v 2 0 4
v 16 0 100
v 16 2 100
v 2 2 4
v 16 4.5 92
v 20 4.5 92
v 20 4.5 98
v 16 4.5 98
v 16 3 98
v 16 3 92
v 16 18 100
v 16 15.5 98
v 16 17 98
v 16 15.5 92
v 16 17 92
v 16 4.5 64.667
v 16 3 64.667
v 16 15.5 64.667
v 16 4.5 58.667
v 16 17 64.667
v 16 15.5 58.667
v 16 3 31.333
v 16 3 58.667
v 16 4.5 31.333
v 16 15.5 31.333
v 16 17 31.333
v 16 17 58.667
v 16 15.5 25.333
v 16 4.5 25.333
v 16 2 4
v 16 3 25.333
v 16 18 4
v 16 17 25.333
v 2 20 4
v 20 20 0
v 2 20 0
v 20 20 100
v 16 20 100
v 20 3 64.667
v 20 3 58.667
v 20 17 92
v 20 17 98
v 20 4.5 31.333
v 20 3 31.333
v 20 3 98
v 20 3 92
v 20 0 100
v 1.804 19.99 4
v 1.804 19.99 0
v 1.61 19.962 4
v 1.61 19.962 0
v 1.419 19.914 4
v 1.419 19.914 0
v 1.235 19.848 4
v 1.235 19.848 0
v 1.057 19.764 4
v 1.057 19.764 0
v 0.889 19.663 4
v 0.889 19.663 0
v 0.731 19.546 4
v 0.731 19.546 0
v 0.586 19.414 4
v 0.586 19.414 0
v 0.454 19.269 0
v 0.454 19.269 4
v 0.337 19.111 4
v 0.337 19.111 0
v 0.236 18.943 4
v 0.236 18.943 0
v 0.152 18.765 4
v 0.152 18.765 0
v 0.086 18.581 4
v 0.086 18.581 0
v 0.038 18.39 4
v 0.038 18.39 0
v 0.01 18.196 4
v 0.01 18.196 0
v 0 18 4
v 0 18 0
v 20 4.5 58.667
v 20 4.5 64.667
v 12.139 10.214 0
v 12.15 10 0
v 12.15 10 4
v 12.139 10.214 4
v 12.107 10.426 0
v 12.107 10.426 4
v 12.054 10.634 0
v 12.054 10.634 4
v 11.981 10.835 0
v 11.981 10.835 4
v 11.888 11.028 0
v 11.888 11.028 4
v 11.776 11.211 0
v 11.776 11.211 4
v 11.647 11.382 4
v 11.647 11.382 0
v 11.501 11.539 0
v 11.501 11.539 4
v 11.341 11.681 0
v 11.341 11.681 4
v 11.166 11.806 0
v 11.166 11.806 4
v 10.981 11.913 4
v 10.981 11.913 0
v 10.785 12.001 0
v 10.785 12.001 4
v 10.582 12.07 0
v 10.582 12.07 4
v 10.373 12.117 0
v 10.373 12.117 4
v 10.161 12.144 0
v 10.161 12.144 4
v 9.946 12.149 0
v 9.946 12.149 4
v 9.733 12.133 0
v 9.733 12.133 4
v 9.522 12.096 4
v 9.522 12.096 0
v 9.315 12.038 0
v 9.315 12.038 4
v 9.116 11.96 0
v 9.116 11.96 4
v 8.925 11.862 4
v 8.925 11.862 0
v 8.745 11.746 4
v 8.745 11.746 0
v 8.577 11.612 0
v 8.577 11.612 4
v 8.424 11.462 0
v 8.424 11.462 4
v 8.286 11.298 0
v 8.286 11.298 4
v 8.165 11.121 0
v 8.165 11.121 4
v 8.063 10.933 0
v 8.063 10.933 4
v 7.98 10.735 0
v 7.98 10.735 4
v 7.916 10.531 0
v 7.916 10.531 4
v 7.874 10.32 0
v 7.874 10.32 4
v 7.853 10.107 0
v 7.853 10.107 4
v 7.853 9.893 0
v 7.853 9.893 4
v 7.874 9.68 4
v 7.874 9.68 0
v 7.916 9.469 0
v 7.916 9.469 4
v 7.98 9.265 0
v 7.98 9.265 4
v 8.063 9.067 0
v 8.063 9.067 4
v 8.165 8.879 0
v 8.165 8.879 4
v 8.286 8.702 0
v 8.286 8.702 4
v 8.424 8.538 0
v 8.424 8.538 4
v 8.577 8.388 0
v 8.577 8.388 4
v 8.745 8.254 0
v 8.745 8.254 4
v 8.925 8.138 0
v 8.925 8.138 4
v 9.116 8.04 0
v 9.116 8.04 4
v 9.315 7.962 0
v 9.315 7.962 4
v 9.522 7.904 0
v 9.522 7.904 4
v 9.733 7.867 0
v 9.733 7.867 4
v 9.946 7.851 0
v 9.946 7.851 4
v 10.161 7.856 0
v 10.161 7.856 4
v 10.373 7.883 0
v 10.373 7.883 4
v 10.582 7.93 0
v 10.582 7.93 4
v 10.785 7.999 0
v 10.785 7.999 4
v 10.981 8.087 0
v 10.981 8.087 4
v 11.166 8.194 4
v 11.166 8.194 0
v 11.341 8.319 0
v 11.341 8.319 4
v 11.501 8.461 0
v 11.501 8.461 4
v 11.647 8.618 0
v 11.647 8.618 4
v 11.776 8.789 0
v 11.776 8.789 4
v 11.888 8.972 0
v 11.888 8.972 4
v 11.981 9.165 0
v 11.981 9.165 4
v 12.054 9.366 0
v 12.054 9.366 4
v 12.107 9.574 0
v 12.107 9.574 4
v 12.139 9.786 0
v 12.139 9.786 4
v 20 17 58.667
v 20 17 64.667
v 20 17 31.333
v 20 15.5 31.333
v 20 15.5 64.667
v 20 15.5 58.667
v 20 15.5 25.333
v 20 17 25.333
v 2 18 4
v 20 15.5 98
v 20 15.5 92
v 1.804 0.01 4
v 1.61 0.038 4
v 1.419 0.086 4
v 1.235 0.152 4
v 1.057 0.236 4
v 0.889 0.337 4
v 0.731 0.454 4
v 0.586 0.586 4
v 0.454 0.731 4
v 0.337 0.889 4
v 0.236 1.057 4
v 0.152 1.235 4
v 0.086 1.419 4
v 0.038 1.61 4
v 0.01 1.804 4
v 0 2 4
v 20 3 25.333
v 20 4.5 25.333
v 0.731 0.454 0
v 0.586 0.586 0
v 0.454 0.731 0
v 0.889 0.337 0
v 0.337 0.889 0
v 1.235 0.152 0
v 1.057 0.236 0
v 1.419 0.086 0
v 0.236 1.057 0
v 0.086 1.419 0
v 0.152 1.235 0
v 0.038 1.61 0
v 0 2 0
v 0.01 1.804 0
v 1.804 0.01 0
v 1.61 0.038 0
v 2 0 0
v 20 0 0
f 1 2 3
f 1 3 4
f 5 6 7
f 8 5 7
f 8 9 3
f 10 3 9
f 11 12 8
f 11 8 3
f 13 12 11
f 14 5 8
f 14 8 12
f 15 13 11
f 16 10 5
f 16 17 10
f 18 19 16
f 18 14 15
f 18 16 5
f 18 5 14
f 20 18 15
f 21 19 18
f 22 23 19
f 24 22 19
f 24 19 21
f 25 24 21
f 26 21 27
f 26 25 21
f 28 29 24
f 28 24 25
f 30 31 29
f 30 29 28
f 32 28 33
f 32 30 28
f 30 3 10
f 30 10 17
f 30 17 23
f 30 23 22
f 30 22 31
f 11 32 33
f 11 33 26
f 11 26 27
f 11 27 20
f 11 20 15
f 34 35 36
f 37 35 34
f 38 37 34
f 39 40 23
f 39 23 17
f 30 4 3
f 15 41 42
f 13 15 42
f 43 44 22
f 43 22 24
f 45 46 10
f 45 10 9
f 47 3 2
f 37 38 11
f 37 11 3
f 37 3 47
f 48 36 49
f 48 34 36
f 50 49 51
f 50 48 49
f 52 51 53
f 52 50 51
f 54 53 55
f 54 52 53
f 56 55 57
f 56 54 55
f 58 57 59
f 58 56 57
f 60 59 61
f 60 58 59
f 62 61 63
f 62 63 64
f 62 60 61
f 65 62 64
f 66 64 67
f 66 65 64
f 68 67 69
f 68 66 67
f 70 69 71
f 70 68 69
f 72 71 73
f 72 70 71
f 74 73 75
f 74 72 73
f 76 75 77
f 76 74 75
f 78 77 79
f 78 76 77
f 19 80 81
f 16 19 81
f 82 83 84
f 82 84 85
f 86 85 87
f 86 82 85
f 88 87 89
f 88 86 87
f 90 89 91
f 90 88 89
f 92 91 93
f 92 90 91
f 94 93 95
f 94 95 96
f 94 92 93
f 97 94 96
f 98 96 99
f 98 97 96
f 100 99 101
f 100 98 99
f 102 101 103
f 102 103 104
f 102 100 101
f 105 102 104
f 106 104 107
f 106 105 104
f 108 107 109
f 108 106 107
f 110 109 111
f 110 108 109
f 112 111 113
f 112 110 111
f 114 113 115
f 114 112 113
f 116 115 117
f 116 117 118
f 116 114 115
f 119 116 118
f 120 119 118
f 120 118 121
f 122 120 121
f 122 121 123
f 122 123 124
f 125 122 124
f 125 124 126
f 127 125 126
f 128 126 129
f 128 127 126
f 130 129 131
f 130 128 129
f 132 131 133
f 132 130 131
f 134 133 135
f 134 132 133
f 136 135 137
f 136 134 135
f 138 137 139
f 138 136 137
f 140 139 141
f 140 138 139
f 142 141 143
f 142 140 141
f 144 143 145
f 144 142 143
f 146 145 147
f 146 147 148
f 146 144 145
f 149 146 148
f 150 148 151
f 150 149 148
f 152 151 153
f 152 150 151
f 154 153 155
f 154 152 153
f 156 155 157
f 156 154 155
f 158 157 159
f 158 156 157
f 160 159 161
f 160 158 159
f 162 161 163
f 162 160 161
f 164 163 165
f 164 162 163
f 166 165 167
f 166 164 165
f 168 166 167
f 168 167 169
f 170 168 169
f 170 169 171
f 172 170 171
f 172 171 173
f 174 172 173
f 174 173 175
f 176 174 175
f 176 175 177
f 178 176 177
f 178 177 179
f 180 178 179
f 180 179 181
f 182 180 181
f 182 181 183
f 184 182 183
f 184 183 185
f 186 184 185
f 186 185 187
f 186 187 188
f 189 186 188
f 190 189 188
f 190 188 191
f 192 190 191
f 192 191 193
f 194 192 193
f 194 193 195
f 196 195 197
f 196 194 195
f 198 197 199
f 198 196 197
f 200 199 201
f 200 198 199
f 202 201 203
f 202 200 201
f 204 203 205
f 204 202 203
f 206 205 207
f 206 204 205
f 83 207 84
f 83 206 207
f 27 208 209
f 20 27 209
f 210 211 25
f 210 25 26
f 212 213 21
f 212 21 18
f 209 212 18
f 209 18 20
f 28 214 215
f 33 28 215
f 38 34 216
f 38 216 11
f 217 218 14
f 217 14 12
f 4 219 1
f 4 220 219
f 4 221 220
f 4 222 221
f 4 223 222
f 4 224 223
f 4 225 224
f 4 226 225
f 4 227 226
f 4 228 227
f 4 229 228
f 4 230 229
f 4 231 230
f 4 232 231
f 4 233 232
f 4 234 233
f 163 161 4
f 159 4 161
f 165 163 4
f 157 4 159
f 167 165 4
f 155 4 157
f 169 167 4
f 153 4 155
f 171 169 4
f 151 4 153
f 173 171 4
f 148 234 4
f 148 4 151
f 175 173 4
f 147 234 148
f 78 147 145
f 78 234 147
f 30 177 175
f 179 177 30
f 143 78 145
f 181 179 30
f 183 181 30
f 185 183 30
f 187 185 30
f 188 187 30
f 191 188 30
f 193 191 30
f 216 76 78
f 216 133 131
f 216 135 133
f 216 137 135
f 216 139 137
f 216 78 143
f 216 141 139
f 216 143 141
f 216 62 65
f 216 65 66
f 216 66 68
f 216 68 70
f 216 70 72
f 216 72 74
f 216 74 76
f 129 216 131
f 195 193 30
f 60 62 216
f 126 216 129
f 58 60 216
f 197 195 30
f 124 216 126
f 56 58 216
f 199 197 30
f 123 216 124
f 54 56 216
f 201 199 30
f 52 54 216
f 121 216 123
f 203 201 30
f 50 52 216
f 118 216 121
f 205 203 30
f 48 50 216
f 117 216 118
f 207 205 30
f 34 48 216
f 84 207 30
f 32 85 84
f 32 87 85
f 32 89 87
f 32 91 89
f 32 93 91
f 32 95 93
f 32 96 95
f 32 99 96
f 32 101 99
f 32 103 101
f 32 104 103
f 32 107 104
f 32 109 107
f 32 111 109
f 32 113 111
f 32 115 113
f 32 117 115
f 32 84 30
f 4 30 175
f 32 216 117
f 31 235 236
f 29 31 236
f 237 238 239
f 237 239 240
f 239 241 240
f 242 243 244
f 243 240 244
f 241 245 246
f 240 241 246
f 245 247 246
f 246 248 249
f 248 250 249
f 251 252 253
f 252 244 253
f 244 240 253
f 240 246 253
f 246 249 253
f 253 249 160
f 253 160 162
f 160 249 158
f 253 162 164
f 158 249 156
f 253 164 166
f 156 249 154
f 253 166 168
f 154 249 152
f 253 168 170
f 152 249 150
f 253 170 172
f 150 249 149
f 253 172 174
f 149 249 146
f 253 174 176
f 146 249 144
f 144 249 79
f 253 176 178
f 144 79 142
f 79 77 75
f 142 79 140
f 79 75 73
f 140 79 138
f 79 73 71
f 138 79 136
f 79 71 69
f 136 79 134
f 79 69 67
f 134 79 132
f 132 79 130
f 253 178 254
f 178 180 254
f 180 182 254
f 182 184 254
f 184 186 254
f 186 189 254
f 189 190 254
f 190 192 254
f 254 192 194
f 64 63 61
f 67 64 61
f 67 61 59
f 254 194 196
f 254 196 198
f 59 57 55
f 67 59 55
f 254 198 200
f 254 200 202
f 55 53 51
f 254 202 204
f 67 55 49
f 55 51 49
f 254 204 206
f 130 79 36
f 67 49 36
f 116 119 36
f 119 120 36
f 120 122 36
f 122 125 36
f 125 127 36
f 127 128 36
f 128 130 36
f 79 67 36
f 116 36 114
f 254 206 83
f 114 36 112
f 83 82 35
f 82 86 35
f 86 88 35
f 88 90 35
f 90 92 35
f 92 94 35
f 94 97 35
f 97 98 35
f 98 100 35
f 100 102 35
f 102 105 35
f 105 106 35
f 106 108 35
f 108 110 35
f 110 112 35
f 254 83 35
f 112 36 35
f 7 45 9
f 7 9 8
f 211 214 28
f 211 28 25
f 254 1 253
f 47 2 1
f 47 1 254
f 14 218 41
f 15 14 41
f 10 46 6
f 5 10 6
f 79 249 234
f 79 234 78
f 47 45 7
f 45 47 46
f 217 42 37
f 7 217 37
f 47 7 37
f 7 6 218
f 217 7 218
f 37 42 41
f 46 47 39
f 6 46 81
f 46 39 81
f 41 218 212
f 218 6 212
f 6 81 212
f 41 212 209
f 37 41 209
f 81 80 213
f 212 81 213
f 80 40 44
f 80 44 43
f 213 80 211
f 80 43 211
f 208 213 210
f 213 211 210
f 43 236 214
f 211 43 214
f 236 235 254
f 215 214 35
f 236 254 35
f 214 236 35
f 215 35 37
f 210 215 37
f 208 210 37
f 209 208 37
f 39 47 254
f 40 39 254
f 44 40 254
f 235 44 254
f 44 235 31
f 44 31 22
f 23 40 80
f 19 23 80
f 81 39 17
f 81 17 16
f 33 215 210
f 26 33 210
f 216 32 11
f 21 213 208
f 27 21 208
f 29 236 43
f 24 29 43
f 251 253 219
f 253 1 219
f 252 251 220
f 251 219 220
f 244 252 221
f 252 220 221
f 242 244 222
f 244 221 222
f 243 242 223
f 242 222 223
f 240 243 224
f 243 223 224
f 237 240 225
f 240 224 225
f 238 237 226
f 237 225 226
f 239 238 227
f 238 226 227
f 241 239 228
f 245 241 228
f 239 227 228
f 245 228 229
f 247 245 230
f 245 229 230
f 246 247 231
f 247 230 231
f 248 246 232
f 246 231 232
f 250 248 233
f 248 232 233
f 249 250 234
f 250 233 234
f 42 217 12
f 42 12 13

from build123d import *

# Parameters (mm, degrees)
F0_W      = 20
F0_H      = 20
F0_R      = 2.15
F1_DEPTH  = 4
F2_W      = 4
F2_H      = 20
F3_DEPTH  = 96
F4_W      = 1.5
F4_H      = 6
F5_DEPTH  = 20.001
F6_R      = 2
F8_DEPTH  = 2
F10_DEPTH = 2


with BuildPart() as f1:
    # F0 (on Top) → F1 (new body)
    with BuildSketch(Plane.XY):
        with Locations((10, 10)):
            Rectangle(F0_W, F0_H)
        with Locations((10, 10)):
            Circle(F0_R, mode=Mode.SUBTRACT)
    extrude(amount=F1_DEPTH)

    # F2 (on face) → F3 (join)
    with BuildSketch(Plane.XY.offset(4)):
        with Locations((18, 10)):
            Rectangle(F2_W, F2_H)
    extrude(amount=F3_DEPTH)

    # F4 (on face) → F5 (cut, through all)
    with BuildSketch(Plane.YZ.offset(20)):
        with Locations((3.75, 95)):
            Rectangle(F4_W, F4_H)
        with Locations((16.25, 95)):
            Rectangle(F4_W, F4_H)
        with Locations((3.75, 61.666667)):
            Rectangle(F4_W, F4_H)
        with Locations((16.25, 61.666667)):
            Rectangle(F4_W, F4_H)
        with Locations((3.75, 28.333333)):
            Rectangle(F4_W, F4_H)
        with Locations((16.25, 28.333333)):
            Rectangle(F4_W, F4_H)
    extrude(amount=-F5_DEPTH, mode=Mode.SUBTRACT)

    # F6
    f6_edges = [f1.edges().sort_by_distance(p)[0] for p in [
        (0, 0, 2),
        (0, 20, 2),
    ]]
    fillet(f6_edges, radius=F6_R)

    # F7 (on face) → F8 (join)
    with BuildSketch(Plane.XZ):
        Polygon((16, 4), (16, 100), (2, 4), align=None)
    extrude(amount=-F8_DEPTH)

    # F9 (on face) → F10 (join)
    with BuildSketch(Plane(origin=(0, 20, 0), x_dir=(-1, 0, 0), z_dir=(0, 1, 0))):
        Polygon((-16, 4), (-2, 4), (-16, 100), align=None)
    extrude(amount=-F10_DEPTH)


solid = f1.part
